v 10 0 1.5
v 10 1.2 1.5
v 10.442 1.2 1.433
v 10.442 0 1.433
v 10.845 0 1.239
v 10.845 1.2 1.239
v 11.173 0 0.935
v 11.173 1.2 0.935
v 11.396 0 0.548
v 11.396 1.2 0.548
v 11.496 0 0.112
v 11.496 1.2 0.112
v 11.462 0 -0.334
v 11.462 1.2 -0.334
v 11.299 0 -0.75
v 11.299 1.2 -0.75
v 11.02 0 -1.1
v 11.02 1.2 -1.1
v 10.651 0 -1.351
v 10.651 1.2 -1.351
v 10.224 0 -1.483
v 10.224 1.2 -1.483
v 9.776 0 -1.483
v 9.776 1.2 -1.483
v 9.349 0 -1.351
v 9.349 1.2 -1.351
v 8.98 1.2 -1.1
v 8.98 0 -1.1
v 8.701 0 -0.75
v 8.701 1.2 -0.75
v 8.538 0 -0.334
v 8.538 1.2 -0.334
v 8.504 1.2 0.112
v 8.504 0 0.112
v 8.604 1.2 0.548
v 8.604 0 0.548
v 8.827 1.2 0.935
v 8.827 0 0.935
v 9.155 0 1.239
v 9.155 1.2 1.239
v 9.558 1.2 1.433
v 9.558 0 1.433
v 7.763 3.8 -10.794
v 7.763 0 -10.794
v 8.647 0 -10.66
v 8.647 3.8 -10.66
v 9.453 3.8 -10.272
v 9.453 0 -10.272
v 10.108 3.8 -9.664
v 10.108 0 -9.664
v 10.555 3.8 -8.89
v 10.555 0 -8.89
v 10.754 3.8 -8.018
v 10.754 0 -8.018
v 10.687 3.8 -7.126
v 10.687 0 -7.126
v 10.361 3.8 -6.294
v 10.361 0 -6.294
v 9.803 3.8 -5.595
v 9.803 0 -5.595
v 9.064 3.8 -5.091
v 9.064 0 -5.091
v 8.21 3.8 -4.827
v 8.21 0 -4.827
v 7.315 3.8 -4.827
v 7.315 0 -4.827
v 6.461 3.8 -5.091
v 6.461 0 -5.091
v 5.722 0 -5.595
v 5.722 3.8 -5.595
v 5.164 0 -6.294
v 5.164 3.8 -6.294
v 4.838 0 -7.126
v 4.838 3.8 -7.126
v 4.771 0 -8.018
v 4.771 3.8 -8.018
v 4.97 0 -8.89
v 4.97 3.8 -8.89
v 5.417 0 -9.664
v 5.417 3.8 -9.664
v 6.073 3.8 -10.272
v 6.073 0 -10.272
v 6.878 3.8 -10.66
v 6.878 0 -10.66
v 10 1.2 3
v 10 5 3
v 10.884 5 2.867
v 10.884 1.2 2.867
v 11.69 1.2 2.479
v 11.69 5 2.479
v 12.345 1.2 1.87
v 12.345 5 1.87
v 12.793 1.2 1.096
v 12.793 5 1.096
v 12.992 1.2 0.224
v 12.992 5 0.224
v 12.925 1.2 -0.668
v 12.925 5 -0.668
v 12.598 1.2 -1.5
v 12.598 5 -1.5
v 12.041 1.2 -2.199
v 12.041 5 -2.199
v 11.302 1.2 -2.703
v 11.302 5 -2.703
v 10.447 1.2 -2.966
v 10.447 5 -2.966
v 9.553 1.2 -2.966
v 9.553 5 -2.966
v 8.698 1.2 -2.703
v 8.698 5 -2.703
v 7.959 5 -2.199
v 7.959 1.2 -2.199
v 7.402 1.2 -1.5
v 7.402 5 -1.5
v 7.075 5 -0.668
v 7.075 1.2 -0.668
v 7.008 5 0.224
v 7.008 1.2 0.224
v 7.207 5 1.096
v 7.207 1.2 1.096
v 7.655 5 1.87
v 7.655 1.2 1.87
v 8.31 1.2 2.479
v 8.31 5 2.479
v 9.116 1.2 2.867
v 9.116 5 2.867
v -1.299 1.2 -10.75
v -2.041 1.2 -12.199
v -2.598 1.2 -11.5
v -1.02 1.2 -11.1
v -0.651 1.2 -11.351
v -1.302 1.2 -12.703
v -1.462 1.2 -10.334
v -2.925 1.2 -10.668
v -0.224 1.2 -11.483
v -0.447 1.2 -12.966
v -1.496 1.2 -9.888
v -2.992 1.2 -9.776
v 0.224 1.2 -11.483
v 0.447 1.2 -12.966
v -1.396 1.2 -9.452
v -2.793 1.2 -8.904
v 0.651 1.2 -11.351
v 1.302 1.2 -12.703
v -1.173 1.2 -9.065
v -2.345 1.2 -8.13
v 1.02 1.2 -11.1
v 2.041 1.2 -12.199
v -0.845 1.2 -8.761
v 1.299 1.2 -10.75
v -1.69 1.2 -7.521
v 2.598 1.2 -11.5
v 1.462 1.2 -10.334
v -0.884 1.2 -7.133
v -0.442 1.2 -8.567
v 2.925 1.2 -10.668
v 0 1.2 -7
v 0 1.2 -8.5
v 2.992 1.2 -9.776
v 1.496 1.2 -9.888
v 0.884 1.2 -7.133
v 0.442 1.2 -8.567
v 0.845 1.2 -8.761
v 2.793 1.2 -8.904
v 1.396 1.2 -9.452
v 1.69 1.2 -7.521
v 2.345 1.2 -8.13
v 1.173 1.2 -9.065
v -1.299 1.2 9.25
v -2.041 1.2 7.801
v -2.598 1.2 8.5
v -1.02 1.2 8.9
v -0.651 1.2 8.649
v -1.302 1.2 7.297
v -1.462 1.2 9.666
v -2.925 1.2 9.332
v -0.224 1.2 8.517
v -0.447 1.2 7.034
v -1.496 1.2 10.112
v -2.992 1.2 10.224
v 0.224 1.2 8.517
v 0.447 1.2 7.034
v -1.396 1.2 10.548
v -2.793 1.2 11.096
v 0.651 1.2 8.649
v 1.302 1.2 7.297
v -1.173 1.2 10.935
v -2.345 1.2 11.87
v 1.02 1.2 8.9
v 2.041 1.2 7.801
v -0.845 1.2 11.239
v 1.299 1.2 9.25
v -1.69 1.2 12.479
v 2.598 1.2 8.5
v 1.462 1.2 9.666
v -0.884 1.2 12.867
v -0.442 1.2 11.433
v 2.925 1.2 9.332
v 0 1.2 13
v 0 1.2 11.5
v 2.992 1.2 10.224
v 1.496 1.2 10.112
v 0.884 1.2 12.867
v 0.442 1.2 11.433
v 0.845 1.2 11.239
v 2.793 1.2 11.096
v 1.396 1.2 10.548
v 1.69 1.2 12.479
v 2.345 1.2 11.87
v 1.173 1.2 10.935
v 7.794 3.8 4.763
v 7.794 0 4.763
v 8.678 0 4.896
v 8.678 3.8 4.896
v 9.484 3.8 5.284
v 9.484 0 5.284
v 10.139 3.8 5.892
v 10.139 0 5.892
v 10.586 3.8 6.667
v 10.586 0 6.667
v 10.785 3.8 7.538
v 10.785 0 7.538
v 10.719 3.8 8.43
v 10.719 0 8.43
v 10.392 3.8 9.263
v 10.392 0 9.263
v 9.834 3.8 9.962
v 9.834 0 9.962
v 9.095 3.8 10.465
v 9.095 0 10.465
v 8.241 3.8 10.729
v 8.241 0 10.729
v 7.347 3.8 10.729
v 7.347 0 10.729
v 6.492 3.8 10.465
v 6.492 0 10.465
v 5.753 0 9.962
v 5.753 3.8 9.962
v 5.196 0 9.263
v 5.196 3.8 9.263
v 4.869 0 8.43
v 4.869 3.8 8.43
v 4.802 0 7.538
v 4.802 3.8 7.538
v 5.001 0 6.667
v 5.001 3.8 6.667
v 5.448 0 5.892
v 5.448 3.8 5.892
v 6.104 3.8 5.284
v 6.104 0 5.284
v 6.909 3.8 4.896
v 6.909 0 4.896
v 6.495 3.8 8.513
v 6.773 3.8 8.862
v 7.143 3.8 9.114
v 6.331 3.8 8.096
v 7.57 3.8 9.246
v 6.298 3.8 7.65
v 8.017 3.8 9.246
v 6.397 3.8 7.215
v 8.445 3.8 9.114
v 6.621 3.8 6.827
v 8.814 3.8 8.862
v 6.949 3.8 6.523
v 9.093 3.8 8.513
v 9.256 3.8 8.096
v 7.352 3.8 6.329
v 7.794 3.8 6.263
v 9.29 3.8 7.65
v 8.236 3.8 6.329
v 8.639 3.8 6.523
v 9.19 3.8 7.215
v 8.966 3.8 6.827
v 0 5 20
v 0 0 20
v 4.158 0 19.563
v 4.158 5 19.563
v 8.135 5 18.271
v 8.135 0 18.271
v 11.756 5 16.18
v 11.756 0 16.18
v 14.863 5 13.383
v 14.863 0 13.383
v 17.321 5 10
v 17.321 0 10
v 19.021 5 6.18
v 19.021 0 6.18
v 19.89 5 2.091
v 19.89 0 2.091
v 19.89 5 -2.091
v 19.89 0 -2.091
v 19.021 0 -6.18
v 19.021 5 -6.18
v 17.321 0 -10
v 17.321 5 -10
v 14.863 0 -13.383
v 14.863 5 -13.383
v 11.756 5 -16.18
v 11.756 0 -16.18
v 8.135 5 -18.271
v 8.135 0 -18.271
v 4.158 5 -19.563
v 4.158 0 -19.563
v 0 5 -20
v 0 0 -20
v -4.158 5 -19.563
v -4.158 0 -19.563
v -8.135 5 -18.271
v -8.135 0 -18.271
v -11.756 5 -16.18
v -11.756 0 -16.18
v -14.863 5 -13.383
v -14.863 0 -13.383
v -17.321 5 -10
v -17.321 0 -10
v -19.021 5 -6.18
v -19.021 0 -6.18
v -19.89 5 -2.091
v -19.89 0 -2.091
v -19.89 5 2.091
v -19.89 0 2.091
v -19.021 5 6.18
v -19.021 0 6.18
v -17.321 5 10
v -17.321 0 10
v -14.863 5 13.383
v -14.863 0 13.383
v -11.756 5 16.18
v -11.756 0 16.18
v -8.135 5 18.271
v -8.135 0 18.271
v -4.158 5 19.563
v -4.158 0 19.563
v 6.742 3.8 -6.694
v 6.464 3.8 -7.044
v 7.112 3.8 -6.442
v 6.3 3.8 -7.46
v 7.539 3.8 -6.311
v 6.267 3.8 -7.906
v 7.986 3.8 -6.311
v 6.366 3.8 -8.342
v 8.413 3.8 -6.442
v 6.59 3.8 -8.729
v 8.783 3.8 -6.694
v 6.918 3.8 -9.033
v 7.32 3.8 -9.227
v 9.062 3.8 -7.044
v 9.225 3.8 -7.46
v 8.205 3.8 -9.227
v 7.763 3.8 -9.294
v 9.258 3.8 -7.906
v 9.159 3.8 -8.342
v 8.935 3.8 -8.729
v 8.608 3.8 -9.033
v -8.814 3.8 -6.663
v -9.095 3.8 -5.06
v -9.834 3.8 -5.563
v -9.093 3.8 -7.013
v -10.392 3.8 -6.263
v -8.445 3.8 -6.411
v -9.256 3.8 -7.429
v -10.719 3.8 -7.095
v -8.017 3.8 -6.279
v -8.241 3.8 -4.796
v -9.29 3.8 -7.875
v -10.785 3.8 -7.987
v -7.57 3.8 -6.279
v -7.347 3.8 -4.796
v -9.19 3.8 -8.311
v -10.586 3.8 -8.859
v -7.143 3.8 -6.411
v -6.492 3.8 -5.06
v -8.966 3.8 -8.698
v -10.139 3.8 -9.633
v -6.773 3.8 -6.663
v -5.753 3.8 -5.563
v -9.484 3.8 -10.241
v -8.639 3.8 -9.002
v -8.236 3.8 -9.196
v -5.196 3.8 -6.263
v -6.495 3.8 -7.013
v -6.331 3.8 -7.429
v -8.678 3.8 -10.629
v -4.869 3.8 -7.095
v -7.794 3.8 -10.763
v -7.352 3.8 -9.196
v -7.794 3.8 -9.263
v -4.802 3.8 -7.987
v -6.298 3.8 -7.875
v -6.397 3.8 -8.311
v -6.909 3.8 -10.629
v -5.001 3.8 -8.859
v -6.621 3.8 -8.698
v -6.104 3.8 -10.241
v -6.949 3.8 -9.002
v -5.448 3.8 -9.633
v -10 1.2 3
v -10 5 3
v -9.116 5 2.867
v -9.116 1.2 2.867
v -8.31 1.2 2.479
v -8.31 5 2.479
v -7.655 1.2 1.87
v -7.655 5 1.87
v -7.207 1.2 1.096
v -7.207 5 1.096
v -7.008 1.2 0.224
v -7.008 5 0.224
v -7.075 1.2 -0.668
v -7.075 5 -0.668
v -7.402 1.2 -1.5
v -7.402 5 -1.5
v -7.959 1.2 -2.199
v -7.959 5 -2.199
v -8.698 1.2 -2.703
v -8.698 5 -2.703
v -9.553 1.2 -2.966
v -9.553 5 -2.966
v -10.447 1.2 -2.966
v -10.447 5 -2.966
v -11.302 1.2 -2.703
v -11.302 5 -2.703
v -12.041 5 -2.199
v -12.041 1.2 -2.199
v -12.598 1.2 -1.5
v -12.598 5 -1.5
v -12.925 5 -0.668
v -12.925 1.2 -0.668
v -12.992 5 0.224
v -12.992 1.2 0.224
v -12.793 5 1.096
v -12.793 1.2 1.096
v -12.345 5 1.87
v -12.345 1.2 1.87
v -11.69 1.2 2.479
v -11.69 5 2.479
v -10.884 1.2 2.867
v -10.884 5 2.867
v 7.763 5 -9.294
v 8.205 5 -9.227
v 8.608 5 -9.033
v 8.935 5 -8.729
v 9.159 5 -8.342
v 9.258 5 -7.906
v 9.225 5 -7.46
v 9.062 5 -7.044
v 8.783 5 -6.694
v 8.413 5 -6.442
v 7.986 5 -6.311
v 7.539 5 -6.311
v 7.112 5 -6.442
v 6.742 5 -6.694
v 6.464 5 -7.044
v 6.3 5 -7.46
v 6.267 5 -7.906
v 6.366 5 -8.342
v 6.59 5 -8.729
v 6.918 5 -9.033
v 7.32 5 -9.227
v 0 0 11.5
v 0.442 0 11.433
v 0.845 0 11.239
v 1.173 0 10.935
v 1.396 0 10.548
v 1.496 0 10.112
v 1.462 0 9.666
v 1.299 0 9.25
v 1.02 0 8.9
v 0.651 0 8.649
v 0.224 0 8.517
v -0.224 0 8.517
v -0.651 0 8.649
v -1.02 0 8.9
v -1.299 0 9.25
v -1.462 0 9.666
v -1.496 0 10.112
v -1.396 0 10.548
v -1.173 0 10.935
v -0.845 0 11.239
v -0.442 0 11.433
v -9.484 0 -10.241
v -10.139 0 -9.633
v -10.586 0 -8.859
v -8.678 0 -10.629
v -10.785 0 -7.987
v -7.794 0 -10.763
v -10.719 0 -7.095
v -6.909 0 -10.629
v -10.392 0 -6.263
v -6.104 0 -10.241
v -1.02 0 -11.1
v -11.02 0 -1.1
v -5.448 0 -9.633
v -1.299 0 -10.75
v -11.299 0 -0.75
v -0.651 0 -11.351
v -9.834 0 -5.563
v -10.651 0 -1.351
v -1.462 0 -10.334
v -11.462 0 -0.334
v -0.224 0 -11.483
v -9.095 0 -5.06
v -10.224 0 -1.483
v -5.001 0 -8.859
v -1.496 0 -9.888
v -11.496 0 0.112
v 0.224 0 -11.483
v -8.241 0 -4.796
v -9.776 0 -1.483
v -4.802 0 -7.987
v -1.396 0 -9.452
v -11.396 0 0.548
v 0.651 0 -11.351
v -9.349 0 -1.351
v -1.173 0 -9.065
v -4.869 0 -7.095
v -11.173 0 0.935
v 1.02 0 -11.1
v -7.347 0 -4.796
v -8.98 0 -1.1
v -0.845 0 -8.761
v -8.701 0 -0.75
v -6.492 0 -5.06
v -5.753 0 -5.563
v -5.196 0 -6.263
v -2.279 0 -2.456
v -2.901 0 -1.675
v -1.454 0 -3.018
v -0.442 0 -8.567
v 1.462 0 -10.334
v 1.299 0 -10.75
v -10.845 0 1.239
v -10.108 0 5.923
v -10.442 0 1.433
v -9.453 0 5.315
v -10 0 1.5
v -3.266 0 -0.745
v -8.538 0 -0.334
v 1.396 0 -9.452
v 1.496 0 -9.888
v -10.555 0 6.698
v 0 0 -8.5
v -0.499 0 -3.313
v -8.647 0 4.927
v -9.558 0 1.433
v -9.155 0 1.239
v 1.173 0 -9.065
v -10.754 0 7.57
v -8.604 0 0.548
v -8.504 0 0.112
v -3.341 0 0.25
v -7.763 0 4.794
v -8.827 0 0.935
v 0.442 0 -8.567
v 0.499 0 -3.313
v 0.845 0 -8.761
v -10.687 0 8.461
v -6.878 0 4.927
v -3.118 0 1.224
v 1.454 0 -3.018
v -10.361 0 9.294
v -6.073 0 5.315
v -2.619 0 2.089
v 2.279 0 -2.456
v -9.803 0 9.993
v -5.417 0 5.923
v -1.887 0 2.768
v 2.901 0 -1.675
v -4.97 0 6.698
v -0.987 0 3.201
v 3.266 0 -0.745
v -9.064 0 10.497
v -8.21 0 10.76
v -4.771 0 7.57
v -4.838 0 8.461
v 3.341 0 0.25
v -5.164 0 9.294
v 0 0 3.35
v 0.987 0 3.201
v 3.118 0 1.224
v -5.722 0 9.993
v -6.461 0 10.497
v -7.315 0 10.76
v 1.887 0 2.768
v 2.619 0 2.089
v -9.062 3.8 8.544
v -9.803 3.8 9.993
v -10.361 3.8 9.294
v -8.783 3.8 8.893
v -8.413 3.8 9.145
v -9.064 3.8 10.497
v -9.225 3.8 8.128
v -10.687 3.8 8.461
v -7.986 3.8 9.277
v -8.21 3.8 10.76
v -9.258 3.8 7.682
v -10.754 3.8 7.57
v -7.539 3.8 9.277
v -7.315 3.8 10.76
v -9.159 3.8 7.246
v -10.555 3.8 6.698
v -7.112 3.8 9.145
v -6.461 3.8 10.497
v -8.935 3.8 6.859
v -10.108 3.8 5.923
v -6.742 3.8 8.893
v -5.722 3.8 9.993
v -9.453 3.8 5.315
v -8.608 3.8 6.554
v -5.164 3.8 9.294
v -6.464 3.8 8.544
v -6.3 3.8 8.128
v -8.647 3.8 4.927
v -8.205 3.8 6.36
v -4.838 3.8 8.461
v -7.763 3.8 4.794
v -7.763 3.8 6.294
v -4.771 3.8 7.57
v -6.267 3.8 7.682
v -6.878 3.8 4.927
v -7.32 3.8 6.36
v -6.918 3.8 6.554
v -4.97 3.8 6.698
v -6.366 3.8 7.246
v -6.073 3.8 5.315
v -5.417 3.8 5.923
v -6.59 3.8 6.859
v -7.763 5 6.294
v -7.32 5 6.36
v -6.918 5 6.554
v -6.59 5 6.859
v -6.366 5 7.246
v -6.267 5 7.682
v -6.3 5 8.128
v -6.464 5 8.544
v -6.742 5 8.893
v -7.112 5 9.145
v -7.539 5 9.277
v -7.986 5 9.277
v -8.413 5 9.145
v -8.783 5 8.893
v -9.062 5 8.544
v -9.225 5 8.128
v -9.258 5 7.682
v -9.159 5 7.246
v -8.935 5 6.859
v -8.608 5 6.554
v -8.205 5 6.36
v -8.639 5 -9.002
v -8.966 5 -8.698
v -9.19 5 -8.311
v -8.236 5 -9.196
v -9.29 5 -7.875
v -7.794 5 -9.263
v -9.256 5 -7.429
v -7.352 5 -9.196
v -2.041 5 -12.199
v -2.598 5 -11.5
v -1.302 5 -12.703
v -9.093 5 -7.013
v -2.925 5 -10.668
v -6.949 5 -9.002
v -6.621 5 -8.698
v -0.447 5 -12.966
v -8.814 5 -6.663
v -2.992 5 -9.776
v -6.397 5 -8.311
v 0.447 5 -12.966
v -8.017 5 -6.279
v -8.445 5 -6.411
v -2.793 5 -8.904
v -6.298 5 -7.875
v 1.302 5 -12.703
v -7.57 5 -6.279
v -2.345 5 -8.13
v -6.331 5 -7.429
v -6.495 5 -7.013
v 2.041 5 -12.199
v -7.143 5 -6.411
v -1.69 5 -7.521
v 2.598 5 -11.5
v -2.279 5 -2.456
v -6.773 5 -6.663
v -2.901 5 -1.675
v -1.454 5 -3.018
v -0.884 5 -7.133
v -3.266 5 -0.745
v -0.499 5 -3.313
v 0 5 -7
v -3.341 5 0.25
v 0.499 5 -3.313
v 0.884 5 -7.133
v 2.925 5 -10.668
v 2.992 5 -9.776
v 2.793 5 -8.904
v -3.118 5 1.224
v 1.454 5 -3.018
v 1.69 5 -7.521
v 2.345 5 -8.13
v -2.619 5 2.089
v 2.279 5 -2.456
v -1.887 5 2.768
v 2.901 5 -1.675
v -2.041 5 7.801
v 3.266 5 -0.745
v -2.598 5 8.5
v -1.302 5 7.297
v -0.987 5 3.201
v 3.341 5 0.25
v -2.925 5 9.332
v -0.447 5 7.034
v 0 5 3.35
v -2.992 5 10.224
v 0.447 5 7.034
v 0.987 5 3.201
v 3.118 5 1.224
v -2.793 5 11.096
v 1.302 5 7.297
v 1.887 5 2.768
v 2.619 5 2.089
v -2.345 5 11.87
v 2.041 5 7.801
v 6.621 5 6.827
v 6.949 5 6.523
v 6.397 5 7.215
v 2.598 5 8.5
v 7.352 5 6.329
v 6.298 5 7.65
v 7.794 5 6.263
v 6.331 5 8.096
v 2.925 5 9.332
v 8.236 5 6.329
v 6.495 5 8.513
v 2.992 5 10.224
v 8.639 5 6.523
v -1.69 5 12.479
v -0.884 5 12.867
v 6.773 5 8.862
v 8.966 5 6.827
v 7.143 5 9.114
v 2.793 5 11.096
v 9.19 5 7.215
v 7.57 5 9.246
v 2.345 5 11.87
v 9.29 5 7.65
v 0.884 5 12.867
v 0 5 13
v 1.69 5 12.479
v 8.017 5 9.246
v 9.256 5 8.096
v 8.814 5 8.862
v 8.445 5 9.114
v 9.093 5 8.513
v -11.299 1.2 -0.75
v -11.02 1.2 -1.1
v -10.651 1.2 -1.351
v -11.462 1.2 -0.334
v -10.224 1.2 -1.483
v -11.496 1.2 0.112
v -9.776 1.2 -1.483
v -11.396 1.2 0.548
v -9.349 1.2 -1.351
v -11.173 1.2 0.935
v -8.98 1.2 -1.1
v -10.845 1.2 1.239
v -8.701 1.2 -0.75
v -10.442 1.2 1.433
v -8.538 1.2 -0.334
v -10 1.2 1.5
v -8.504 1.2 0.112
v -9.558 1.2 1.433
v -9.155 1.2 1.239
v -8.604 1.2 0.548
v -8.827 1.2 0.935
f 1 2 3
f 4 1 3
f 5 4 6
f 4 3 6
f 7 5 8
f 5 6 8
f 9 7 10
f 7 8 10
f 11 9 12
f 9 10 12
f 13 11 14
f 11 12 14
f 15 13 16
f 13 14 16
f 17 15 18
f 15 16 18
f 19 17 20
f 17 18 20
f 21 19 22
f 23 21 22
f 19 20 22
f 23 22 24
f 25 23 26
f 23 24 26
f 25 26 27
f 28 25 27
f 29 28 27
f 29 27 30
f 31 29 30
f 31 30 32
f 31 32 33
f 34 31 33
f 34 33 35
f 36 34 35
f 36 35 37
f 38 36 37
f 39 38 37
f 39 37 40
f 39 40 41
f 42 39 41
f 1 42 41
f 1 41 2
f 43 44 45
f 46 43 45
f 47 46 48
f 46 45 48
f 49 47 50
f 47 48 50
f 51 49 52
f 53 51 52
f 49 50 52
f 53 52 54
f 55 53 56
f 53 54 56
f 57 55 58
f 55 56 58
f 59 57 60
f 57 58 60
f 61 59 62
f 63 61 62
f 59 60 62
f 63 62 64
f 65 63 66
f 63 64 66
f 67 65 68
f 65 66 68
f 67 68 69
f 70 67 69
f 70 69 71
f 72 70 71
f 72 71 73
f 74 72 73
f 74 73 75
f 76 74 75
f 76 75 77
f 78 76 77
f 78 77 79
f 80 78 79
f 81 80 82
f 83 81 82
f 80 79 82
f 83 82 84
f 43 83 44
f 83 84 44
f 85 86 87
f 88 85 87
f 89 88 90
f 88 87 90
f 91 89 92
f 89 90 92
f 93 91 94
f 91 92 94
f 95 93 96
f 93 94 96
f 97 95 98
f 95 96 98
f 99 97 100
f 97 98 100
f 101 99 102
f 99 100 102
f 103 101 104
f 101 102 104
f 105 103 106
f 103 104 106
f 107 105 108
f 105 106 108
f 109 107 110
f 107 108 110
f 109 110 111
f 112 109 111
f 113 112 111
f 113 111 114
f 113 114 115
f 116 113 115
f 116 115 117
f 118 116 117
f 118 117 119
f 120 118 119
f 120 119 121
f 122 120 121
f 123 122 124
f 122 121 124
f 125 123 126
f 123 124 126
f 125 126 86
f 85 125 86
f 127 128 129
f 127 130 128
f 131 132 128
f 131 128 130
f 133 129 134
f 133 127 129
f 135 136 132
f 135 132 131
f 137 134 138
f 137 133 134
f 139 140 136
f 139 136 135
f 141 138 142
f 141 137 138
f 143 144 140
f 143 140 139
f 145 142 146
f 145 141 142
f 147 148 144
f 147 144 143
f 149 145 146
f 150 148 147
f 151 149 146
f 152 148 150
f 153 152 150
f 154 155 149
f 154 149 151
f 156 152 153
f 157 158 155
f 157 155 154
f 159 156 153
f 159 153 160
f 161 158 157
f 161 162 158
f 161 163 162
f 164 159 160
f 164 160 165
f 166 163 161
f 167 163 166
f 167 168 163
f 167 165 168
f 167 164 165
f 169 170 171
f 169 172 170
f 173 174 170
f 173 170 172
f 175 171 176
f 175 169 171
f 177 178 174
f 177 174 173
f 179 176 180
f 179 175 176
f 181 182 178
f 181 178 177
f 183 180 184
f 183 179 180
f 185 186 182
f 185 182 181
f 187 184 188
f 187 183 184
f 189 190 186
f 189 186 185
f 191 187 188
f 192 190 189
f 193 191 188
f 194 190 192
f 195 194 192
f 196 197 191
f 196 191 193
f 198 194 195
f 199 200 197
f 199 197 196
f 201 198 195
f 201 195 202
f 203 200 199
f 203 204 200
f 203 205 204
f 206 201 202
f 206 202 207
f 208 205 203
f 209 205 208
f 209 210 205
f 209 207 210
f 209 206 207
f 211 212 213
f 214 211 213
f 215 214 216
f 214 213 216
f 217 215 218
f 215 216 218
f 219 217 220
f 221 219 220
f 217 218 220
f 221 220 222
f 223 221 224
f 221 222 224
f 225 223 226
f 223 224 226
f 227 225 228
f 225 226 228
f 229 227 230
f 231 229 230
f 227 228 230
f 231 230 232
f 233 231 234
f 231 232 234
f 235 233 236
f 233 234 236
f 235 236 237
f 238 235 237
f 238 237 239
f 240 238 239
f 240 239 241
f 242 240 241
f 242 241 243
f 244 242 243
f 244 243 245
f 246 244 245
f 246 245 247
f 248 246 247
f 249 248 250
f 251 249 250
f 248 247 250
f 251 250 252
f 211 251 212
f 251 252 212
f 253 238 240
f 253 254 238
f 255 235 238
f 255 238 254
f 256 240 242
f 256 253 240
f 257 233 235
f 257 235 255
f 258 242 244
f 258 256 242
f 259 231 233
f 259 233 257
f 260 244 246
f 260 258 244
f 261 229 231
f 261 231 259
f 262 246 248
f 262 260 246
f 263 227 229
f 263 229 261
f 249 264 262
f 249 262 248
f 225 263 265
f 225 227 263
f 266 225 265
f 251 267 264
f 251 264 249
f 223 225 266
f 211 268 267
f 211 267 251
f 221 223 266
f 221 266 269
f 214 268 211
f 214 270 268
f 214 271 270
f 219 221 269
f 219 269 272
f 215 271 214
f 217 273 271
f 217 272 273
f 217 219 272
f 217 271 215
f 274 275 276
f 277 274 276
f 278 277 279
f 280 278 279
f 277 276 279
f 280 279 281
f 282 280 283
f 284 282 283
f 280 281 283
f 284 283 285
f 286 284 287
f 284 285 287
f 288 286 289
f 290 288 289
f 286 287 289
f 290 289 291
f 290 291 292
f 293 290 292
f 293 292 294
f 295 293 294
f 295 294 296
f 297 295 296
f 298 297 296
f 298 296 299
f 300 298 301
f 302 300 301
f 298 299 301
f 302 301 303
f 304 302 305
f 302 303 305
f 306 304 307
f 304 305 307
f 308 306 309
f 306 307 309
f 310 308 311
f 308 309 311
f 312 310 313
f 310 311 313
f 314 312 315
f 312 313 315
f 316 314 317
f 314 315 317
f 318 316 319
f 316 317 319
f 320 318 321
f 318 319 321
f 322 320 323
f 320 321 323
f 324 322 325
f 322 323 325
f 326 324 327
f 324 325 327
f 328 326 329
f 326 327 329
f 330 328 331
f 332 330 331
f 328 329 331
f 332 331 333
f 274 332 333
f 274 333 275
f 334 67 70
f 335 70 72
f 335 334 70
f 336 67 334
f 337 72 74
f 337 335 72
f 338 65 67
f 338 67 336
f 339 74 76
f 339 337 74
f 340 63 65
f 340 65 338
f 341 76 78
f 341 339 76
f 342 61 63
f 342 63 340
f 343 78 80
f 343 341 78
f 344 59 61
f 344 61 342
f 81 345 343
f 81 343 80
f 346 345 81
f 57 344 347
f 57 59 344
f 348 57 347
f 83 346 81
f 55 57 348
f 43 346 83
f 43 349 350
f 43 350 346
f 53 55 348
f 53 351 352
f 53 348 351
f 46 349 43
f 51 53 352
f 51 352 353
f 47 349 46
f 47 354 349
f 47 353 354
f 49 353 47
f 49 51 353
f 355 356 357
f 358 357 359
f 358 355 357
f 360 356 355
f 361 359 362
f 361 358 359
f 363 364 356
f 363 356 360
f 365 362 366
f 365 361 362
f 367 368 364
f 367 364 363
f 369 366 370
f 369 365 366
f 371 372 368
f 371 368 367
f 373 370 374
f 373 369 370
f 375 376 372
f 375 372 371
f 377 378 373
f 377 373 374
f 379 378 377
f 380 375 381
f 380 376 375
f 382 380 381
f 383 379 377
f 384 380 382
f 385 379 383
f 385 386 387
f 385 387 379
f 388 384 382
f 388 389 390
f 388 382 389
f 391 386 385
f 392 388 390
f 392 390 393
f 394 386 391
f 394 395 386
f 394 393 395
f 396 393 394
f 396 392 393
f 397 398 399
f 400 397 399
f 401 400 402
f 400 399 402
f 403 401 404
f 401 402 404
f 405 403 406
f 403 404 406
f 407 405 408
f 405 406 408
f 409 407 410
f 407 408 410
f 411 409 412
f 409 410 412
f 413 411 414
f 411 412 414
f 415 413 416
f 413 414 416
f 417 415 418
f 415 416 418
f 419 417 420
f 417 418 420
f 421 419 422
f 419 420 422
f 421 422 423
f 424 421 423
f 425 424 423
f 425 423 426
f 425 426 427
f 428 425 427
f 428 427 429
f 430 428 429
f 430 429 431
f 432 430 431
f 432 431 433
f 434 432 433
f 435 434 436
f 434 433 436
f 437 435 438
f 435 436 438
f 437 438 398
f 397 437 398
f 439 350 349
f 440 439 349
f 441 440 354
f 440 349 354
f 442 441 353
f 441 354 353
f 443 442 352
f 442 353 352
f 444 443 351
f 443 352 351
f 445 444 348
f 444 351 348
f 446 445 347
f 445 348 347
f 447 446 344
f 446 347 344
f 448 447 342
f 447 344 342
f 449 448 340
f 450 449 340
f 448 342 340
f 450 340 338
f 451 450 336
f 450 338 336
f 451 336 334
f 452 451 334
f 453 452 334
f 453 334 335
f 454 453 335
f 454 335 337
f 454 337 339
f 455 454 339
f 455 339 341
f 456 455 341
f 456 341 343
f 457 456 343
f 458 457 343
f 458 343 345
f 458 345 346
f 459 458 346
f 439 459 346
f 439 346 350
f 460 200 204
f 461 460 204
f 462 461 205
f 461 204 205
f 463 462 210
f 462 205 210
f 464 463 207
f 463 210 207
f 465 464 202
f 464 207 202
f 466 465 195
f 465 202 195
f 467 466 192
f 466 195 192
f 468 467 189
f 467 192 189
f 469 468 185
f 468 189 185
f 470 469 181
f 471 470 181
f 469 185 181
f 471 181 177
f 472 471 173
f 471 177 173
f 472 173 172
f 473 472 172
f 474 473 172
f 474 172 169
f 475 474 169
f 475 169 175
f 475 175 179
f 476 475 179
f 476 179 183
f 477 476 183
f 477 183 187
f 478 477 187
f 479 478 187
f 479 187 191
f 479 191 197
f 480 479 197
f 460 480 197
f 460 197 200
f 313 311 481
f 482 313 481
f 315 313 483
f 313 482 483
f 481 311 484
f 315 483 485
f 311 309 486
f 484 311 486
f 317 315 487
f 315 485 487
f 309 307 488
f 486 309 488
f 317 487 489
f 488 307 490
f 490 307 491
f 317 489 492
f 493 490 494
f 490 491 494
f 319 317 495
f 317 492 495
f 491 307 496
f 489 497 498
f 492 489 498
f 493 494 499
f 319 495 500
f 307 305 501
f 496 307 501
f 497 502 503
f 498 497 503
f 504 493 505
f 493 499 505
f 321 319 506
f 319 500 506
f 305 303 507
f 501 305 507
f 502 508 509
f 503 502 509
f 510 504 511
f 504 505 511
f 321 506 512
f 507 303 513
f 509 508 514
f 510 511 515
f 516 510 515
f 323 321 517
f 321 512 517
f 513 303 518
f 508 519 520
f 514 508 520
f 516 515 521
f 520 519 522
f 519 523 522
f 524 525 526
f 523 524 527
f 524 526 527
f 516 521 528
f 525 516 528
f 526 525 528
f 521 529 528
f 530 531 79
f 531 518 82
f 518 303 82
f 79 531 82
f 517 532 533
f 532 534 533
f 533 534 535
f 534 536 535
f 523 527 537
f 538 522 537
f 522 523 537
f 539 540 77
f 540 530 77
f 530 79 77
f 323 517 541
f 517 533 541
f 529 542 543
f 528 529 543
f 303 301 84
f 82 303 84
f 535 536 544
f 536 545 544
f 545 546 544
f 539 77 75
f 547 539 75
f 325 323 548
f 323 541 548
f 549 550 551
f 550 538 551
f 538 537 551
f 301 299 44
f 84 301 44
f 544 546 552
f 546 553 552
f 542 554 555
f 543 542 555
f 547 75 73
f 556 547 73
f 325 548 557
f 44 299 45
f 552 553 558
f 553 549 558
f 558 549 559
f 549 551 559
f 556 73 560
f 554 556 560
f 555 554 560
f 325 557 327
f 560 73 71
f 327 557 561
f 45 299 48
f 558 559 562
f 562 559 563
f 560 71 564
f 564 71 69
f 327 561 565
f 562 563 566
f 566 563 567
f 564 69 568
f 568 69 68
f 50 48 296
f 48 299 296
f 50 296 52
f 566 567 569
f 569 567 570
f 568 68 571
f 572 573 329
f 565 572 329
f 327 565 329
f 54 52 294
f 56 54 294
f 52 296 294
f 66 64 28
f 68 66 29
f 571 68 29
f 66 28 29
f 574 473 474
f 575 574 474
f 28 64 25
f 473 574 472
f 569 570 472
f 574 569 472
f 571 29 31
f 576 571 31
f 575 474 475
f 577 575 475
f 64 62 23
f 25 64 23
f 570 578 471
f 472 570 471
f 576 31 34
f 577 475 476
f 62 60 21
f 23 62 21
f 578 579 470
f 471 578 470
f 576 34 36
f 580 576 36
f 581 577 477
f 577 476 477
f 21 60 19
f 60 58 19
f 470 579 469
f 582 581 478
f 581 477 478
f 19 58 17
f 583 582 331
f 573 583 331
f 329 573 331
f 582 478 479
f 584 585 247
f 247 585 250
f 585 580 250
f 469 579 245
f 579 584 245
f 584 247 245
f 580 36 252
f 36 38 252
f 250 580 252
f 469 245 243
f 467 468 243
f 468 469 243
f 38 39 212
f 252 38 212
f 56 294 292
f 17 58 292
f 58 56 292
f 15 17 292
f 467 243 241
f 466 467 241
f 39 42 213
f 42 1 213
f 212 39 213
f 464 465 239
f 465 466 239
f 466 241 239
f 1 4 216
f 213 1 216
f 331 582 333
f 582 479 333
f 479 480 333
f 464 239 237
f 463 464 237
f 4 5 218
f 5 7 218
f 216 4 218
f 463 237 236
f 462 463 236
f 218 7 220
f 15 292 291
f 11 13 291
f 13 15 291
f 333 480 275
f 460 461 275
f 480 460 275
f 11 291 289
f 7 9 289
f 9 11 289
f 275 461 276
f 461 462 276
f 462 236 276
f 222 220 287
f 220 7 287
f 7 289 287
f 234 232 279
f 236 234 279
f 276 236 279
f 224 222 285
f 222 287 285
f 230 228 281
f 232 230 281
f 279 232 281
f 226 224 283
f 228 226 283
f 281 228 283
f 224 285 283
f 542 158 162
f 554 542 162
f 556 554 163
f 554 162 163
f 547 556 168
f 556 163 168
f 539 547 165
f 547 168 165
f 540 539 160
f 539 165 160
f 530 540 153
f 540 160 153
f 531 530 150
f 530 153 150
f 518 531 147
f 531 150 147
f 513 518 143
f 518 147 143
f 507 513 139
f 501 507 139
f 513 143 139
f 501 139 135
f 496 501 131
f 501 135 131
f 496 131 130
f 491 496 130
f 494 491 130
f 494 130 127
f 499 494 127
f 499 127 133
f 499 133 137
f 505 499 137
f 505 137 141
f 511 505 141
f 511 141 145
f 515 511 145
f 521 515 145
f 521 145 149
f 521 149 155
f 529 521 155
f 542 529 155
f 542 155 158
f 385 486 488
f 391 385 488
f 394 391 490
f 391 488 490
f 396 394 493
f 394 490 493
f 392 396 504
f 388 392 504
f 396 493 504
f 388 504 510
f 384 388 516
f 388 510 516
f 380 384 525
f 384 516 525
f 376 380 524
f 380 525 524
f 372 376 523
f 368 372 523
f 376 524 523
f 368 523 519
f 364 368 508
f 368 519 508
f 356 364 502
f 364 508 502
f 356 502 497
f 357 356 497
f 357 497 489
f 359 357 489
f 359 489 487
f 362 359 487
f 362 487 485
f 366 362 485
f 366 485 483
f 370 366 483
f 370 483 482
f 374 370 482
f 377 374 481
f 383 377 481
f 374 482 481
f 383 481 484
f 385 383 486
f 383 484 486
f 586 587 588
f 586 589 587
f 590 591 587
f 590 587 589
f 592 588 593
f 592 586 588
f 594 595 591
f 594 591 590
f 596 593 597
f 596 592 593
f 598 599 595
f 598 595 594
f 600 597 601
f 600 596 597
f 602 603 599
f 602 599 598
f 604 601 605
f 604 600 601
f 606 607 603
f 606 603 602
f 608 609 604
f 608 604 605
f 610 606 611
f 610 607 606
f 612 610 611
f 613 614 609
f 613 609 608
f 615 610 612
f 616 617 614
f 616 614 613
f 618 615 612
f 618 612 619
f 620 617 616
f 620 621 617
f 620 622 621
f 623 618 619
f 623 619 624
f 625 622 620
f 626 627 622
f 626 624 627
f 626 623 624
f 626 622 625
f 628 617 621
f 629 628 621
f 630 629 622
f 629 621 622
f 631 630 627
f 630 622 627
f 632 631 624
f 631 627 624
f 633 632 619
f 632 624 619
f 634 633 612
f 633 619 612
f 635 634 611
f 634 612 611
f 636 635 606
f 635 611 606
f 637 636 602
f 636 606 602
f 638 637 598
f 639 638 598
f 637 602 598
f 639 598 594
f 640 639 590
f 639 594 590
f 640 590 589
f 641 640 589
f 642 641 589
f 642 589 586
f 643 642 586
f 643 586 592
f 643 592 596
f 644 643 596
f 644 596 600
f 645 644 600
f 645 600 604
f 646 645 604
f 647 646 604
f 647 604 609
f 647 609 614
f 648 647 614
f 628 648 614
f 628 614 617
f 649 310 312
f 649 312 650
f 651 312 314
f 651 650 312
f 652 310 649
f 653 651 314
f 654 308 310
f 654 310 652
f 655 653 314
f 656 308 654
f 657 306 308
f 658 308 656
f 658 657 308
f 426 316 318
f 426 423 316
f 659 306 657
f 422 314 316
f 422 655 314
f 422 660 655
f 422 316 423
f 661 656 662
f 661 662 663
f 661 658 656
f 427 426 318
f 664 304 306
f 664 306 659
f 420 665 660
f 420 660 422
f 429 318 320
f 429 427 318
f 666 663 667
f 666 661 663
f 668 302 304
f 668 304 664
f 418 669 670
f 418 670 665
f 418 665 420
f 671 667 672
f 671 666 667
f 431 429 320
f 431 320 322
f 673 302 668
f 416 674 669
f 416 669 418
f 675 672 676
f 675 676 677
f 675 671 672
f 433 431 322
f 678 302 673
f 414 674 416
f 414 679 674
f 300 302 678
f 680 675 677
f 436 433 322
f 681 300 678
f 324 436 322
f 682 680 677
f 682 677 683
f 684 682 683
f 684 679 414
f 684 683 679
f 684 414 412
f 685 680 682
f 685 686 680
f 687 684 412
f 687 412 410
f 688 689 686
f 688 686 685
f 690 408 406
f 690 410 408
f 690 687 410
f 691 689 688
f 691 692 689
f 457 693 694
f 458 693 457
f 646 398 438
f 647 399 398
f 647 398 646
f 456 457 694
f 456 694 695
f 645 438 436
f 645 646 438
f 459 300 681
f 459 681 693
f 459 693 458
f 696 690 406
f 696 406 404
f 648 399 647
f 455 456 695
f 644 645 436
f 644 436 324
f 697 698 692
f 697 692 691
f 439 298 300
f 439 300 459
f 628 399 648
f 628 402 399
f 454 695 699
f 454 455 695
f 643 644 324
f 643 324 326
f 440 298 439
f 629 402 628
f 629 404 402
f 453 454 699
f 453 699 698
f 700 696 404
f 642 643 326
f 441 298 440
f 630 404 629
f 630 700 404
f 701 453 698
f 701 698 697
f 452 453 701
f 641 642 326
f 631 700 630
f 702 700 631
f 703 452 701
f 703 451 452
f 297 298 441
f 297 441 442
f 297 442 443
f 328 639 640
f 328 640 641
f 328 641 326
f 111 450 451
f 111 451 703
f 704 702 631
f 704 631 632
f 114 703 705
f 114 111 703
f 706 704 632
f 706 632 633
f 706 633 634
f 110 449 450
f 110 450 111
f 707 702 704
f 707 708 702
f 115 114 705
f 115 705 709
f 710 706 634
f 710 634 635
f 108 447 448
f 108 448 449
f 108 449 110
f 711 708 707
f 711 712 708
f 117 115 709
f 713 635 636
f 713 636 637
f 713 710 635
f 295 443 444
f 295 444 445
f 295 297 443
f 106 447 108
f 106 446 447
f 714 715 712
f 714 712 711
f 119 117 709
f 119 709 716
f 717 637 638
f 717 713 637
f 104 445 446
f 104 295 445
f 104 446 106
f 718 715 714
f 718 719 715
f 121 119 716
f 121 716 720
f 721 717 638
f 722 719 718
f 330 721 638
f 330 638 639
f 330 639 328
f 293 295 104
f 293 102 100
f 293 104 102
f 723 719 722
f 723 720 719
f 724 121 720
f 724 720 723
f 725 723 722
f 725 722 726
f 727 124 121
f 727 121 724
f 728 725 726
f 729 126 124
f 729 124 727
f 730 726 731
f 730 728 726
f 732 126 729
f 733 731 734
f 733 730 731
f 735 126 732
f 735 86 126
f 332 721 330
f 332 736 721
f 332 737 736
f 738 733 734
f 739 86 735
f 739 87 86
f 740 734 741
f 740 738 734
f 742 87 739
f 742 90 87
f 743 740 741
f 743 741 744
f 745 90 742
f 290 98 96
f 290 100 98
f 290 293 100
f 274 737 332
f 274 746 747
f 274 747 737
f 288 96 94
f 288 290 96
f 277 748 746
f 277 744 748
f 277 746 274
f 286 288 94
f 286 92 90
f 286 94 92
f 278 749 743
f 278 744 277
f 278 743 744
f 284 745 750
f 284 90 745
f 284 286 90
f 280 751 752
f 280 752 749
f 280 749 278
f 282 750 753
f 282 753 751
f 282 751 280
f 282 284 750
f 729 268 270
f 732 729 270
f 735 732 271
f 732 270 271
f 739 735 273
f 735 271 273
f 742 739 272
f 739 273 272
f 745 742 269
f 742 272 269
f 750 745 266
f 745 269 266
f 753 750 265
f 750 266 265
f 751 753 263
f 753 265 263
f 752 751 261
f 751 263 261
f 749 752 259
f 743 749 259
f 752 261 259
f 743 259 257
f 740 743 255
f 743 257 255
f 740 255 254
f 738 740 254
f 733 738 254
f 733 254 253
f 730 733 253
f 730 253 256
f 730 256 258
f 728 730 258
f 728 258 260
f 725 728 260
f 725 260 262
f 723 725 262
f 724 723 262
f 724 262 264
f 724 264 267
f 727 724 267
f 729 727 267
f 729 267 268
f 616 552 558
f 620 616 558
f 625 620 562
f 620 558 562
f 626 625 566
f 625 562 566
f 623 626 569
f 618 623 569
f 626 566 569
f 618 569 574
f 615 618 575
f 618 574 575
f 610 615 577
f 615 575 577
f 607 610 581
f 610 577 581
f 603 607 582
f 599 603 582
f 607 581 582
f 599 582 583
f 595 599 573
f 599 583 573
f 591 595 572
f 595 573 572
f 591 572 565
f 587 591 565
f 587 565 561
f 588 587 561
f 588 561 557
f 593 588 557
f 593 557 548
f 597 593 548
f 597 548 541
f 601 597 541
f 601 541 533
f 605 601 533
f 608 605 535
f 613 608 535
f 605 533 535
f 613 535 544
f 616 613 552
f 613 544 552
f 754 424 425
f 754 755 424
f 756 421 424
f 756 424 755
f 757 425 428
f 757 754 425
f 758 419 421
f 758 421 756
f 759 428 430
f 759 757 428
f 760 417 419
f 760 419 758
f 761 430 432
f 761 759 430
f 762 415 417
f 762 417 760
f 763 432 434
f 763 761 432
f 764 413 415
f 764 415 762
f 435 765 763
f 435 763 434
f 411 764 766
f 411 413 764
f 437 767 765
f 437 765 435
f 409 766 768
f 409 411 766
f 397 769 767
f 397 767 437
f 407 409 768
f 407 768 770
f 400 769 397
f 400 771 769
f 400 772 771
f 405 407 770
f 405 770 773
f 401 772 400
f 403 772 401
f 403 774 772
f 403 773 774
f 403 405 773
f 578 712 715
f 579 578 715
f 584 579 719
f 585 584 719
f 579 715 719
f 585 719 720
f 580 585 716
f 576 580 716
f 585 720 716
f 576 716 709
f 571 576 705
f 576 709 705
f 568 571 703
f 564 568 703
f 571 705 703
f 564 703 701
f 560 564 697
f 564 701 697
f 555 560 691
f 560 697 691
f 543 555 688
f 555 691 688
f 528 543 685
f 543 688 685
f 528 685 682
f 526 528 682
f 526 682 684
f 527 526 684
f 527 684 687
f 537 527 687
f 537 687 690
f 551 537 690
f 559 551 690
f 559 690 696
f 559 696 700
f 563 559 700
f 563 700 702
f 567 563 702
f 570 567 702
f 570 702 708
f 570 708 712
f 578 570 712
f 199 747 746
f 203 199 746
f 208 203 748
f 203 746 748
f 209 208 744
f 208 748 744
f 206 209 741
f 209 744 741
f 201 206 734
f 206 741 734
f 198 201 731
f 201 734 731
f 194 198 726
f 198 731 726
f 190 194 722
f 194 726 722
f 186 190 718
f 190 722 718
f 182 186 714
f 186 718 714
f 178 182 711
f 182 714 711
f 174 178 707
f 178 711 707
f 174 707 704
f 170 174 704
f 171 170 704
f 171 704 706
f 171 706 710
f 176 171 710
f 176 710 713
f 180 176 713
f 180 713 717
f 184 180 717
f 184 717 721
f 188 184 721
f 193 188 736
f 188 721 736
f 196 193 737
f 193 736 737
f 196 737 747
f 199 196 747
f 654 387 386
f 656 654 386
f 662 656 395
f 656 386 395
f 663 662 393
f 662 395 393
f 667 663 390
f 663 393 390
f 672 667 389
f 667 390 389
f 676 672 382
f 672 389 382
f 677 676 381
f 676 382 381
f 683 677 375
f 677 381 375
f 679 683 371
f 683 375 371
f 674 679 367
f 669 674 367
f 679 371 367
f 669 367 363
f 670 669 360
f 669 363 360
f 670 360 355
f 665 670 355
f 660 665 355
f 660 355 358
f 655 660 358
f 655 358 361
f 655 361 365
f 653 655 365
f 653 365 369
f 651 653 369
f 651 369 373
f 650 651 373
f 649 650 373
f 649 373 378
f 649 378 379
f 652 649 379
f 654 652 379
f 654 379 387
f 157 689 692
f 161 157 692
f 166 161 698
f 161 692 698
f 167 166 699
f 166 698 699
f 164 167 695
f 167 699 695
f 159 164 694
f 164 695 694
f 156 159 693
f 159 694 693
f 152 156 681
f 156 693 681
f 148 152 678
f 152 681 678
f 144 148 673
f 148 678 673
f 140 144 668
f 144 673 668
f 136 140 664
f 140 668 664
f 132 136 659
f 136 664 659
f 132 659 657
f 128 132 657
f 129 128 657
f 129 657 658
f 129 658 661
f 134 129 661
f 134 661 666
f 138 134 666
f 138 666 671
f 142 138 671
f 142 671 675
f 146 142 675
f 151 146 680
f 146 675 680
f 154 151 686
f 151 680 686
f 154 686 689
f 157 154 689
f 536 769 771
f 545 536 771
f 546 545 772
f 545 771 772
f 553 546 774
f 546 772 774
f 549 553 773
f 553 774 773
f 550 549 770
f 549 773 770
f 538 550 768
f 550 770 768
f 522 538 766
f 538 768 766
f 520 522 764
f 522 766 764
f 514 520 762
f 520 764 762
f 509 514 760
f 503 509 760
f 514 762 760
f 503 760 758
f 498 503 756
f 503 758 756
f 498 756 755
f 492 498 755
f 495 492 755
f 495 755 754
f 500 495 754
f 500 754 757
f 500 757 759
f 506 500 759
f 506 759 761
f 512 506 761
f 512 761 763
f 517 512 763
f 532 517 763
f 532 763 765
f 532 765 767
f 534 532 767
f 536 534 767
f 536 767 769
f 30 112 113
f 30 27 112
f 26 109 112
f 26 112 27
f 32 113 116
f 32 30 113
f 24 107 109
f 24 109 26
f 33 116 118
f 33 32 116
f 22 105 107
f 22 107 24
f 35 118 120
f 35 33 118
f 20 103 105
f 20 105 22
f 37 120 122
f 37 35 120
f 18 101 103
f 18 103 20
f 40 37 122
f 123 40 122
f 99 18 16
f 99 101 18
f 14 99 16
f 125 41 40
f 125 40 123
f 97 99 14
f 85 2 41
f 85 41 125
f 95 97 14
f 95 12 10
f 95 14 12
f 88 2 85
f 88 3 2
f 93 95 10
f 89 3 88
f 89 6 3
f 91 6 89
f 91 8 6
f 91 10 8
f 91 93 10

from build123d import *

# Parameters (mm, degrees)
SKETCH2_R           = 20
BOSS_EXTRUDE1_DEPTH = 5
SKETCH3_R           = 3.35
CUT_EXTRUDE1_DEPTH  = 6
SKETCH4_R           = 1.5
CUT_EXTRUDE3_DEPTH  = 6
SKETCH6_R           = 3
CUT_EXTRUDE4_DEPTH  = 3.8
SKETCH7_R           = 1.5
CUT_EXTRUDE5_DEPTH  = 29.722813233
SKETCH8_R           = 3
CUT_EXTRUDE6_DEPTH  = 3.8


with BuildPart() as part:
    # Sketch2 → Boss-Extrude1 (new body)
    with BuildSketch(Plane(origin=(0, 0, 0), x_dir=(1, 0, 0), z_dir=(0, 1, 0))):
        with Locations(Location((0, 0, 0), (0, 0, 270))):
            Circle(SKETCH2_R)
    extrude(amount=BOSS_EXTRUDE1_DEPTH)

    # Sketch3 → Cut-Extrude1 (cut)
    with BuildSketch(Plane(origin=(0, 5, 0), x_dir=(1, 0, 0), z_dir=(0, 1, 0))):
        with Locations(Location((0, 0, 0), (0, 0, 270))):
            Circle(SKETCH3_R)
    extrude(amount=-CUT_EXTRUDE1_DEPTH, mode=Mode.SUBTRACT)

    # Sketch4 → Cut-Extrude3 (cut)
    with BuildSketch(Plane(origin=(0, 5, 0), x_dir=(1, 0, 0), z_dir=(0, 1, 0))):
        with Locations(Location((0, 10, 0), (0, 0, 270))):
            Circle(SKETCH4_R)
        with Locations(Location((10, 0, 0), (0, 0, 270))):
            Circle(SKETCH4_R)
        with Locations(Location((0, -10, 0), (0, 0, 270))):
            Circle(SKETCH4_R)
        with Locations(Location((-10, 0, 0), (0, 0, 270))):
            Circle(SKETCH4_R)
    extrude(amount=-CUT_EXTRUDE3_DEPTH, mode=Mode.SUBTRACT)

    # Sketch6 → Cut-Extrude4 (cut)
    with BuildSketch(Plane(origin=(0, 5, 0), x_dir=(1, 0, 0), z_dir=(0, 1, 0))):
        with Locations(Location((0, 10, 0), (0, 0, 270))):
            Circle(SKETCH6_R)
        with Locations(Location((10, 0, 0), (0, 0, 270))):
            Circle(SKETCH6_R)
        with Locations(Location((0, -10, 0), (0, 0, 270))):
            Circle(SKETCH6_R)
        with Locations(Location((-10, 0, 0), (0, 0, 270))):
            Circle(SKETCH6_R)
    extrude(amount=-CUT_EXTRUDE4_DEPTH, mode=Mode.SUBTRACT)

    # Sketch7 → Cut-Extrude5 (cut, through all)
    with BuildSketch(Plane.XZ):
        with Locations(Location((7.793746467, 7.762571482, 0), (0, 0, 270))):
            Circle(SKETCH7_R)
        with Locations(Location((7.762571482, -7.793746467, 0), (0, 0, 270))):
            Circle(SKETCH7_R)
        with Locations(Location((-7.793746467, -7.762571482, 0), (0, 0, 270))):
            Circle(SKETCH7_R)
        with Locations(Location((-7.762571482, 7.793746467, 0), (0, 0, 270))):
            Circle(SKETCH7_R)
    extrude(amount=-CUT_EXTRUDE5_DEPTH, mode=Mode.SUBTRACT)

    # Sketch8 → Cut-Extrude6 (cut)
    with BuildSketch(Plane(origin=(0, 0, 0), x_dir=(-1, 0, 0), z_dir=(0, -1, 0))):
        with Locations(Location((-7.793746467, -7.762571482, 0), (0, 0, 90))):
            Circle(SKETCH8_R)
        with Locations(Location((-7.762571482, 7.793746467, 0), (0, 0, 90))):
            Circle(SKETCH8_R)
        with Locations(Location((7.793746467, 7.762571482, 0), (0, 0, 90))):
            Circle(SKETCH8_R)
        with Locations(Location((7.762571482, -7.793746467, 0), (0, 0, 90))):
            Circle(SKETCH8_R)
    extrude(amount=-CUT_EXTRUDE6_DEPTH, mode=Mode.SUBTRACT)


solid = part.part
